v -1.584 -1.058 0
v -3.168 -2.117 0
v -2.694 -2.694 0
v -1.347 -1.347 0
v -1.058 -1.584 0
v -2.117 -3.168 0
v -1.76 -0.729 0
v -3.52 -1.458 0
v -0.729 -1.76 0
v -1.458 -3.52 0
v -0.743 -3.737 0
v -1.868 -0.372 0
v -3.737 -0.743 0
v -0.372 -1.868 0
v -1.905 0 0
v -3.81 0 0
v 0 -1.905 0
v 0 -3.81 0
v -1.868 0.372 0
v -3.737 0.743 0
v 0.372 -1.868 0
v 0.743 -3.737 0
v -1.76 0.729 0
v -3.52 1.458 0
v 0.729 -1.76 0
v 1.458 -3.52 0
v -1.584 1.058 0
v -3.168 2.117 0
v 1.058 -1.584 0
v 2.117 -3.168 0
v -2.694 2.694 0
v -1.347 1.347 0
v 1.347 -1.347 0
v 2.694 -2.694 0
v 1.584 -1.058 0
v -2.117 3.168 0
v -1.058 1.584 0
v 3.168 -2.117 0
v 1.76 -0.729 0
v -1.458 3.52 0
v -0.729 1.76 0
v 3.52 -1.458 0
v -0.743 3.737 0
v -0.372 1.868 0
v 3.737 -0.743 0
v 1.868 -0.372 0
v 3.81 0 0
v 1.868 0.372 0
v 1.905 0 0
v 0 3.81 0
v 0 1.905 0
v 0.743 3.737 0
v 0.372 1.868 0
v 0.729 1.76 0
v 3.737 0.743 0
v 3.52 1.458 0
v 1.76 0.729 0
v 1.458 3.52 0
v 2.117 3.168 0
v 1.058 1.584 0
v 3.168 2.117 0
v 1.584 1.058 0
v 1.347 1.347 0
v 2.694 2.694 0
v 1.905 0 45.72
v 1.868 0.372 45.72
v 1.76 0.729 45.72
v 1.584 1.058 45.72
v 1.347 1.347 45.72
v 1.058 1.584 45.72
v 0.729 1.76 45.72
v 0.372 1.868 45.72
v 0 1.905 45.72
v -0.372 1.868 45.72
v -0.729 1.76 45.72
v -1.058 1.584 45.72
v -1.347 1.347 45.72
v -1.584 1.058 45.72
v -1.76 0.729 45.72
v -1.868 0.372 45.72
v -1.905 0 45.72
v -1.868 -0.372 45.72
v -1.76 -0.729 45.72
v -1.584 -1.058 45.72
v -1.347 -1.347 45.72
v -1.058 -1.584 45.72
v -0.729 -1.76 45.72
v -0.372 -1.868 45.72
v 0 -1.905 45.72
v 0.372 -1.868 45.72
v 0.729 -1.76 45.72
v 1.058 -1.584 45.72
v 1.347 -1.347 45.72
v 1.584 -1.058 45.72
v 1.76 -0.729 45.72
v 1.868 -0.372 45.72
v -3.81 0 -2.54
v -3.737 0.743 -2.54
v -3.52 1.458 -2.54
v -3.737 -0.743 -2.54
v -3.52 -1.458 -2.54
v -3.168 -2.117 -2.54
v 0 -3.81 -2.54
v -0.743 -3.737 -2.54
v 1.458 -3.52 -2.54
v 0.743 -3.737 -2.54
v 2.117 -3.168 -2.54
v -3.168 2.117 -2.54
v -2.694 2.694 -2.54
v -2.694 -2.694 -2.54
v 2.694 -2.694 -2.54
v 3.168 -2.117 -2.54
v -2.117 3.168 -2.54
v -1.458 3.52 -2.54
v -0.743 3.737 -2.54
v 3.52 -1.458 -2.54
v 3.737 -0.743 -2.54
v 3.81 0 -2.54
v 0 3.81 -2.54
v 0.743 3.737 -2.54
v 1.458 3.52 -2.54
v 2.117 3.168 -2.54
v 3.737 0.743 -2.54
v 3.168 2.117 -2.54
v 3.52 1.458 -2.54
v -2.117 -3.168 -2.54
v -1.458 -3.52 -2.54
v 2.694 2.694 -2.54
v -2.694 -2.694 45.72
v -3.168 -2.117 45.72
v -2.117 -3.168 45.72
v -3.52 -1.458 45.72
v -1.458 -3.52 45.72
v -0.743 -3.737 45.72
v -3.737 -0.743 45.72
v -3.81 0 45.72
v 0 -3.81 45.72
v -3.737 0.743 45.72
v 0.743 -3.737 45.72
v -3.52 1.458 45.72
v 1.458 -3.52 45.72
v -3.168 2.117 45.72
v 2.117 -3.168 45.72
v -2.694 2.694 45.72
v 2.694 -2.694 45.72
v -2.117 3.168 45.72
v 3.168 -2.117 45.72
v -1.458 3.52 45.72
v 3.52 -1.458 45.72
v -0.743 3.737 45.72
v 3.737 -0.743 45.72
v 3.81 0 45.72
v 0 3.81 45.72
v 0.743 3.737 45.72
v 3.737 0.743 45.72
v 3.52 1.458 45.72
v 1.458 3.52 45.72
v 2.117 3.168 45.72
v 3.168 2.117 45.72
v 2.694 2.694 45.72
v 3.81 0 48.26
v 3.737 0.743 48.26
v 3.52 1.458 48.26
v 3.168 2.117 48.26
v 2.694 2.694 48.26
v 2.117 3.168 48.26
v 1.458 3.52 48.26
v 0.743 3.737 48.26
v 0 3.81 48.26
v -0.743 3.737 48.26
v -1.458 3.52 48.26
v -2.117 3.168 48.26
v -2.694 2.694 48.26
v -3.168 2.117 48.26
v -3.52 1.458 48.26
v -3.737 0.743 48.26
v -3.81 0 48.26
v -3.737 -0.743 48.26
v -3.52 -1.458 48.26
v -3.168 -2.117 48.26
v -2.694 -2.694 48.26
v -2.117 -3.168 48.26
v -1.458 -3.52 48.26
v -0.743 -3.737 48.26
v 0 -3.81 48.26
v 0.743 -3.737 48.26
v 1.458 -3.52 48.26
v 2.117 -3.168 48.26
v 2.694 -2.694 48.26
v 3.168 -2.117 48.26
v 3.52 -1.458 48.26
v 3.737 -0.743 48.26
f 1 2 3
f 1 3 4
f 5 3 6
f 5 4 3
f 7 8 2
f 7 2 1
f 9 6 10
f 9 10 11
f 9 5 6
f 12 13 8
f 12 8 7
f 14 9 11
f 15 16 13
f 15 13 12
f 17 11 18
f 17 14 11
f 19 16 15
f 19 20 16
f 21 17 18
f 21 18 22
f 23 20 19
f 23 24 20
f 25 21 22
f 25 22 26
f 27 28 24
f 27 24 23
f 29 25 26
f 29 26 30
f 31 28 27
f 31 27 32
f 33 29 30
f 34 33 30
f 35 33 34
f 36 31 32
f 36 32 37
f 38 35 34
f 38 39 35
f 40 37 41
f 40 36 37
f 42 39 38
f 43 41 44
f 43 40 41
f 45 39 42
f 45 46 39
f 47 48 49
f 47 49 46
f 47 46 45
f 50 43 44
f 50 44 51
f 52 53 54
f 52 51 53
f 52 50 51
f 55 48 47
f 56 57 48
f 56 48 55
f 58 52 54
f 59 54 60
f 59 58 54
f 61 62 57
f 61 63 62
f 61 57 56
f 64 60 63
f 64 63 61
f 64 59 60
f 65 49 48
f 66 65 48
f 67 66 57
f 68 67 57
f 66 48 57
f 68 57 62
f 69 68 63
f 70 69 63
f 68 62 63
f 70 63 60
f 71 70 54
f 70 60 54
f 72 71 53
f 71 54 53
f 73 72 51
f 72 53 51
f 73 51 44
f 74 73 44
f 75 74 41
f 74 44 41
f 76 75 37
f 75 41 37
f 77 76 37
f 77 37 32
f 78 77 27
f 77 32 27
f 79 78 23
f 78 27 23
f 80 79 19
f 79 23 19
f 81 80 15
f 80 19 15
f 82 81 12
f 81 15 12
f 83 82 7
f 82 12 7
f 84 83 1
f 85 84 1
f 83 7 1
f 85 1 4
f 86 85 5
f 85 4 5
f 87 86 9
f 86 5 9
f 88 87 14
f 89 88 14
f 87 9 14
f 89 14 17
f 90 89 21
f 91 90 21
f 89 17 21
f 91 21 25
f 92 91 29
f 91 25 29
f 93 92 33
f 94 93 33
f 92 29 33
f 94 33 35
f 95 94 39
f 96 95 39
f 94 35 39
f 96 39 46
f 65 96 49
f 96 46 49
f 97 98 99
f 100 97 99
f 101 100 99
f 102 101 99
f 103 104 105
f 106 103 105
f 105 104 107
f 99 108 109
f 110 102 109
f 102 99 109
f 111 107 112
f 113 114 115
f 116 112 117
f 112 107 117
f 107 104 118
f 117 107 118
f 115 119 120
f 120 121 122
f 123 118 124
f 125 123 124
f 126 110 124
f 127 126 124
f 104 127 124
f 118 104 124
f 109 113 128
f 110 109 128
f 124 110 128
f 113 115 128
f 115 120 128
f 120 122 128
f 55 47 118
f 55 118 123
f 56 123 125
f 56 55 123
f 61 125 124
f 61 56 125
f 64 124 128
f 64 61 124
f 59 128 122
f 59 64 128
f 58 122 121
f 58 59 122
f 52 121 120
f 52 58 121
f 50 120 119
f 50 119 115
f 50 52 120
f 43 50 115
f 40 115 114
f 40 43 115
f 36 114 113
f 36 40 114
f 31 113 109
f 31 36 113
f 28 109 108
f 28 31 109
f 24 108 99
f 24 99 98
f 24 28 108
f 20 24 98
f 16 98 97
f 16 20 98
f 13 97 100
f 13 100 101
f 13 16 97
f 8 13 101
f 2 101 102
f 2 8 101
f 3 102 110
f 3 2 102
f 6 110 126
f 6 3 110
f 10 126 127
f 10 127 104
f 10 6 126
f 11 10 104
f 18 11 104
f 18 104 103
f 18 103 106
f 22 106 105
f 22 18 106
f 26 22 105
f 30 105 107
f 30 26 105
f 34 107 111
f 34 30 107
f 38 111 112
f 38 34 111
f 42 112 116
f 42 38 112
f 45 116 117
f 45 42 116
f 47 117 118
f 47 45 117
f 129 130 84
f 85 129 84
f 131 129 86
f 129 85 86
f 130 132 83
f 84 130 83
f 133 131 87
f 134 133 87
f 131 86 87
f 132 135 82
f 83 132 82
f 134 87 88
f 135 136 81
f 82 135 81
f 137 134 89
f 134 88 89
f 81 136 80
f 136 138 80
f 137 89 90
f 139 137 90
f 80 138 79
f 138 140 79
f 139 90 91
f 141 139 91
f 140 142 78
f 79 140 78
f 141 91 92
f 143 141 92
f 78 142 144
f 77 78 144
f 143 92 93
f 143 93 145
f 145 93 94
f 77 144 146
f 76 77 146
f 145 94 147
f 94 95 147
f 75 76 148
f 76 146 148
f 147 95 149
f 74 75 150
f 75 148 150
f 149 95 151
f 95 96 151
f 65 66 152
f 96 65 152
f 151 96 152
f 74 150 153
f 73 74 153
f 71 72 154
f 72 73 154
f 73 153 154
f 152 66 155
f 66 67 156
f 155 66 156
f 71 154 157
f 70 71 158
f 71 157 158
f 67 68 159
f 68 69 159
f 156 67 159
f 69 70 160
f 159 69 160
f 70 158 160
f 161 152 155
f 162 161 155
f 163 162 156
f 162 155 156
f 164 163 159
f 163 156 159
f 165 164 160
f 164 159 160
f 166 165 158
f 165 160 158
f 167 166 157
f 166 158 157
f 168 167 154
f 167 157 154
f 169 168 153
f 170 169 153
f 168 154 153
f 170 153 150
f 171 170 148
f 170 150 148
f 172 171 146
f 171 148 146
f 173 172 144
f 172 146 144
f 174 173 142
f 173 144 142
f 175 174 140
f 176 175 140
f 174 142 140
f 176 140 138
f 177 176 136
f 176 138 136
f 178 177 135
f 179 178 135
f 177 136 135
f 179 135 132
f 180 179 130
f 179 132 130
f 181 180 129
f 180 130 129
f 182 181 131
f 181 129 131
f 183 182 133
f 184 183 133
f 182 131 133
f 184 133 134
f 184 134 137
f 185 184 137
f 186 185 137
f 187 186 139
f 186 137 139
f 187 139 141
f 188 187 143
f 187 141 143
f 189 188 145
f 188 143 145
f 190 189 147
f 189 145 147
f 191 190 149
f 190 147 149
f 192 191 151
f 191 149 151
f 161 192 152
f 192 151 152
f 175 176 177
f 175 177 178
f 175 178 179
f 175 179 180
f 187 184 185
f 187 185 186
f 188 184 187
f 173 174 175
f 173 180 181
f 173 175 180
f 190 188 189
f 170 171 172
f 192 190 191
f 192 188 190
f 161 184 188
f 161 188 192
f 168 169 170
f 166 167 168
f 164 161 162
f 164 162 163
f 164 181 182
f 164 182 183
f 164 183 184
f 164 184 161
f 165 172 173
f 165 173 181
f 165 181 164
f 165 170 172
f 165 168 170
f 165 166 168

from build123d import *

# Parameters (mm, degrees)
SKETCH1_R           = 1.905
BOSS_EXTRUDE1_DEPTH = 45.72
SKETCH4_R           = 3.81
BOSS_EXTRUDE2_DEPTH = 2.54


with BuildPart() as part:
    # Sketch1 → Boss-Extrude1 (new body)
    with BuildSketch(Plane.XY):
        Circle(SKETCH1_R)
    extrude(amount=BOSS_EXTRUDE1_DEPTH)

    # Sketch4 → Boss-Extrude2 (add)
    with BuildSketch(Plane.XY.offset(45.72)):
        Circle(SKETCH4_R)
    boss_extrude2 = extrude(amount=BOSS_EXTRUDE2_DEPTH)

    # Mirror1: Boss-Extrude2 across plane
    add(boss_extrude2.mirror(Plane.XY.offset(22.86)))


solid = part.part
